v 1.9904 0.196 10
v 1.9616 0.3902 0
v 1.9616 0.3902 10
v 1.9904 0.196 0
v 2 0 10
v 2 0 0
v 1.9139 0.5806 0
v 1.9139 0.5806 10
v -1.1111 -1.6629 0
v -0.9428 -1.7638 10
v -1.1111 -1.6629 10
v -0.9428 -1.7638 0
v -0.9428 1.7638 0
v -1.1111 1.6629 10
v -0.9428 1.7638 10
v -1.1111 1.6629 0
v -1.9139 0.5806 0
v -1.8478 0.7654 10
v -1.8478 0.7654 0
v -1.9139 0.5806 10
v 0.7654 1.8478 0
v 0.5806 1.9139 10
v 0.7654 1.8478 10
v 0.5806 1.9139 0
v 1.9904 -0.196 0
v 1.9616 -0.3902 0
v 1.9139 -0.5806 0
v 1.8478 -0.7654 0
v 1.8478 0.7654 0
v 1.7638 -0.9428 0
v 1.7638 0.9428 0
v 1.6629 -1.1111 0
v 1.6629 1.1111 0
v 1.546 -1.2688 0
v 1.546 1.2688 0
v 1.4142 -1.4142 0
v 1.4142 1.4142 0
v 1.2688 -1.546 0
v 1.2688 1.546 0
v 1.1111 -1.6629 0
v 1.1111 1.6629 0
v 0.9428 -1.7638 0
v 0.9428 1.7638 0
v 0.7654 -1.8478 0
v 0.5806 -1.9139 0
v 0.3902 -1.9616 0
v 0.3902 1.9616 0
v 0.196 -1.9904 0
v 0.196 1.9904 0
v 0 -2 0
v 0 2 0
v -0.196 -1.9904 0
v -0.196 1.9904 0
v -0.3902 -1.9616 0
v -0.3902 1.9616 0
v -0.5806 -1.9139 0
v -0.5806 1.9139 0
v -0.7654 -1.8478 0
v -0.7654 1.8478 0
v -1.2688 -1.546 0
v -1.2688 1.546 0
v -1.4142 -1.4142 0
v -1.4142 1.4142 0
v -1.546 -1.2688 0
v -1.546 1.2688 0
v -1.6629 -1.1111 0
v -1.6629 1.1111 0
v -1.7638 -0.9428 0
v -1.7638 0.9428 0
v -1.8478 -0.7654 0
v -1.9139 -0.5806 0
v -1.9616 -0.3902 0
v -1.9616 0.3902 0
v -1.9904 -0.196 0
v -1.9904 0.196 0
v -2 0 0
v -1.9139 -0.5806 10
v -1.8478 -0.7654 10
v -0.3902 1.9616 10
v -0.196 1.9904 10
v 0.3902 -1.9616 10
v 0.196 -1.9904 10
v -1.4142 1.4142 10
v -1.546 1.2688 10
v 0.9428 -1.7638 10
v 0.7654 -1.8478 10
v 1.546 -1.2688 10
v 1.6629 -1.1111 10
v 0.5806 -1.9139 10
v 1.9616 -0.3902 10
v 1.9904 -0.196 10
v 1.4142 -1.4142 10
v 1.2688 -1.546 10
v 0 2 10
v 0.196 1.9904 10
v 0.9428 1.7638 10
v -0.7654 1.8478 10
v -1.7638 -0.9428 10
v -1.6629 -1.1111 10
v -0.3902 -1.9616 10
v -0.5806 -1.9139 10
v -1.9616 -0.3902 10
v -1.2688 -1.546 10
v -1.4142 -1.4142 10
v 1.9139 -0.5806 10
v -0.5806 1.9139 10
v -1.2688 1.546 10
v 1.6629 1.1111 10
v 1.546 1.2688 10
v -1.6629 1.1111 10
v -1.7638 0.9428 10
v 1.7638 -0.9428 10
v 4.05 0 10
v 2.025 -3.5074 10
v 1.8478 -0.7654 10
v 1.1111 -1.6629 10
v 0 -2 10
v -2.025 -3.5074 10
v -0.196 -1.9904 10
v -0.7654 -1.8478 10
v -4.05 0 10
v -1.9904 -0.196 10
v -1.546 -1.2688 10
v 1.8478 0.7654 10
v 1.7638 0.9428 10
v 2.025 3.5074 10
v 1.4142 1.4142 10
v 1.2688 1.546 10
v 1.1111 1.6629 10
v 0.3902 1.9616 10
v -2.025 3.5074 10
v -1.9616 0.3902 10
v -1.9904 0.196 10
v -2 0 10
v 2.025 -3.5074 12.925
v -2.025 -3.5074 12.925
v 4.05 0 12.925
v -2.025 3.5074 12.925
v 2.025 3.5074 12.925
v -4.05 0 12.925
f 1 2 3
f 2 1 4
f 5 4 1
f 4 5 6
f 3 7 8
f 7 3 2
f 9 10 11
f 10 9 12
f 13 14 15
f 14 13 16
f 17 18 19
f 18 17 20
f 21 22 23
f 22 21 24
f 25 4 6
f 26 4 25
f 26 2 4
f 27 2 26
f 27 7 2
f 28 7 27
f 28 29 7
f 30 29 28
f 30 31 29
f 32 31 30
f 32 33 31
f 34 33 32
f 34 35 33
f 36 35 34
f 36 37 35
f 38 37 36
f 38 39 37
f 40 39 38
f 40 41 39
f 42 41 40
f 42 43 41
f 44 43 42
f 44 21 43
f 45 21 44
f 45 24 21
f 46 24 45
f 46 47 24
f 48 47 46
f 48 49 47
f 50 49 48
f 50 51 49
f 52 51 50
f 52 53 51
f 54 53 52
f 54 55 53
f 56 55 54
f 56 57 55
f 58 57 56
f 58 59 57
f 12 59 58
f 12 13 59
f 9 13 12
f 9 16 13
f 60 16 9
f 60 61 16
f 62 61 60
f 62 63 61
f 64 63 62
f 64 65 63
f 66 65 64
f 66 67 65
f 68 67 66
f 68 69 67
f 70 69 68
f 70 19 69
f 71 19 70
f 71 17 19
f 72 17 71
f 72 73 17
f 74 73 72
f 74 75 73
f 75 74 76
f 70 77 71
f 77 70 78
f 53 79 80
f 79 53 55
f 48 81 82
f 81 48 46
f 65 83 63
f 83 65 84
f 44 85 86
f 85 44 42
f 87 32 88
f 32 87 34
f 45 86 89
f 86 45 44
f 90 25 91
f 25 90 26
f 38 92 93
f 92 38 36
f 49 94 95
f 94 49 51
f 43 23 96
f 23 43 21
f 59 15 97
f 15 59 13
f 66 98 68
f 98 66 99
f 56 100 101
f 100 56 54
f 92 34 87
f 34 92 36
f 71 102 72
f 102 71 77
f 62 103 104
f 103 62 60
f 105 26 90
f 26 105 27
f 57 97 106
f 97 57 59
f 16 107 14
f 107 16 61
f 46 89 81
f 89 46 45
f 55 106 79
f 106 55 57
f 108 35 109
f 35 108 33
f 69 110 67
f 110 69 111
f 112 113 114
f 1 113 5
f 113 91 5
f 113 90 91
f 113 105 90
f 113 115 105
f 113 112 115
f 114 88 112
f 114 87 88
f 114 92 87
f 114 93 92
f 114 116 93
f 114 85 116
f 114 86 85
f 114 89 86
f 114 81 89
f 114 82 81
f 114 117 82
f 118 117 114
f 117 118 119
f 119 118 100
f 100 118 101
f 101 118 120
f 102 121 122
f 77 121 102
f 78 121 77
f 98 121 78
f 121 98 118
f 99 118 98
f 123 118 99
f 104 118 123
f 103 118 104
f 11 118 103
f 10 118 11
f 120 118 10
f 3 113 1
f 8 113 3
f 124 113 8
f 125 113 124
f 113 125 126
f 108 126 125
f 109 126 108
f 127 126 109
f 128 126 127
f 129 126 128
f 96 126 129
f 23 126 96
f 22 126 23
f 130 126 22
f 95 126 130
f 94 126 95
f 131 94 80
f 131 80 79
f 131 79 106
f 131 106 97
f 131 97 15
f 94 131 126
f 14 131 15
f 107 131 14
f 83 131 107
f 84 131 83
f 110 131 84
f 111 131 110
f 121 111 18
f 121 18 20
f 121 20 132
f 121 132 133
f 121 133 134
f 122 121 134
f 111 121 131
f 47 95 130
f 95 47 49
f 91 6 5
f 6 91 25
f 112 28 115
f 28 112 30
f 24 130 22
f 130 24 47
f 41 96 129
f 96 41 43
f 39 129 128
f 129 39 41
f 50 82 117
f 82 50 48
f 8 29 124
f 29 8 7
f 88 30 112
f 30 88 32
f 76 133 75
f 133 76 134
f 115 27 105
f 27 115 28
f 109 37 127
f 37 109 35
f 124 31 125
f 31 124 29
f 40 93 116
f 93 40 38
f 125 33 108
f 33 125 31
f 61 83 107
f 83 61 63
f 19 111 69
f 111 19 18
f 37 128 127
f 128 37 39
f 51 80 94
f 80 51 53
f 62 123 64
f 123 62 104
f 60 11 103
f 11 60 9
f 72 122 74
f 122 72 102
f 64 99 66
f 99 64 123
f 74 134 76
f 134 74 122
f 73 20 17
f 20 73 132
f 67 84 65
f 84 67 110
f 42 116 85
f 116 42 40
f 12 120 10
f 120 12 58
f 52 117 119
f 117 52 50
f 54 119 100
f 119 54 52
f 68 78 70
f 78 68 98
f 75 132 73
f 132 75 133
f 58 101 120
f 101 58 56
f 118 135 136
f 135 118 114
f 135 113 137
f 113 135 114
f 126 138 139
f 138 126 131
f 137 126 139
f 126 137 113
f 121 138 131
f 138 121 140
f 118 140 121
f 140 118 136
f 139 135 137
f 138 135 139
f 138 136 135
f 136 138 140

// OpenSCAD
module hex_head_screw() {
    union() {
        // Screw shaft
        cylinder(d=4.0, h=10, $fn=64);
        
        // Hex head
        translate([0, 0, 10])
            cylinder(d=8.1, h=2.925, $fn=6);
    }
}

hex_head_screw();
